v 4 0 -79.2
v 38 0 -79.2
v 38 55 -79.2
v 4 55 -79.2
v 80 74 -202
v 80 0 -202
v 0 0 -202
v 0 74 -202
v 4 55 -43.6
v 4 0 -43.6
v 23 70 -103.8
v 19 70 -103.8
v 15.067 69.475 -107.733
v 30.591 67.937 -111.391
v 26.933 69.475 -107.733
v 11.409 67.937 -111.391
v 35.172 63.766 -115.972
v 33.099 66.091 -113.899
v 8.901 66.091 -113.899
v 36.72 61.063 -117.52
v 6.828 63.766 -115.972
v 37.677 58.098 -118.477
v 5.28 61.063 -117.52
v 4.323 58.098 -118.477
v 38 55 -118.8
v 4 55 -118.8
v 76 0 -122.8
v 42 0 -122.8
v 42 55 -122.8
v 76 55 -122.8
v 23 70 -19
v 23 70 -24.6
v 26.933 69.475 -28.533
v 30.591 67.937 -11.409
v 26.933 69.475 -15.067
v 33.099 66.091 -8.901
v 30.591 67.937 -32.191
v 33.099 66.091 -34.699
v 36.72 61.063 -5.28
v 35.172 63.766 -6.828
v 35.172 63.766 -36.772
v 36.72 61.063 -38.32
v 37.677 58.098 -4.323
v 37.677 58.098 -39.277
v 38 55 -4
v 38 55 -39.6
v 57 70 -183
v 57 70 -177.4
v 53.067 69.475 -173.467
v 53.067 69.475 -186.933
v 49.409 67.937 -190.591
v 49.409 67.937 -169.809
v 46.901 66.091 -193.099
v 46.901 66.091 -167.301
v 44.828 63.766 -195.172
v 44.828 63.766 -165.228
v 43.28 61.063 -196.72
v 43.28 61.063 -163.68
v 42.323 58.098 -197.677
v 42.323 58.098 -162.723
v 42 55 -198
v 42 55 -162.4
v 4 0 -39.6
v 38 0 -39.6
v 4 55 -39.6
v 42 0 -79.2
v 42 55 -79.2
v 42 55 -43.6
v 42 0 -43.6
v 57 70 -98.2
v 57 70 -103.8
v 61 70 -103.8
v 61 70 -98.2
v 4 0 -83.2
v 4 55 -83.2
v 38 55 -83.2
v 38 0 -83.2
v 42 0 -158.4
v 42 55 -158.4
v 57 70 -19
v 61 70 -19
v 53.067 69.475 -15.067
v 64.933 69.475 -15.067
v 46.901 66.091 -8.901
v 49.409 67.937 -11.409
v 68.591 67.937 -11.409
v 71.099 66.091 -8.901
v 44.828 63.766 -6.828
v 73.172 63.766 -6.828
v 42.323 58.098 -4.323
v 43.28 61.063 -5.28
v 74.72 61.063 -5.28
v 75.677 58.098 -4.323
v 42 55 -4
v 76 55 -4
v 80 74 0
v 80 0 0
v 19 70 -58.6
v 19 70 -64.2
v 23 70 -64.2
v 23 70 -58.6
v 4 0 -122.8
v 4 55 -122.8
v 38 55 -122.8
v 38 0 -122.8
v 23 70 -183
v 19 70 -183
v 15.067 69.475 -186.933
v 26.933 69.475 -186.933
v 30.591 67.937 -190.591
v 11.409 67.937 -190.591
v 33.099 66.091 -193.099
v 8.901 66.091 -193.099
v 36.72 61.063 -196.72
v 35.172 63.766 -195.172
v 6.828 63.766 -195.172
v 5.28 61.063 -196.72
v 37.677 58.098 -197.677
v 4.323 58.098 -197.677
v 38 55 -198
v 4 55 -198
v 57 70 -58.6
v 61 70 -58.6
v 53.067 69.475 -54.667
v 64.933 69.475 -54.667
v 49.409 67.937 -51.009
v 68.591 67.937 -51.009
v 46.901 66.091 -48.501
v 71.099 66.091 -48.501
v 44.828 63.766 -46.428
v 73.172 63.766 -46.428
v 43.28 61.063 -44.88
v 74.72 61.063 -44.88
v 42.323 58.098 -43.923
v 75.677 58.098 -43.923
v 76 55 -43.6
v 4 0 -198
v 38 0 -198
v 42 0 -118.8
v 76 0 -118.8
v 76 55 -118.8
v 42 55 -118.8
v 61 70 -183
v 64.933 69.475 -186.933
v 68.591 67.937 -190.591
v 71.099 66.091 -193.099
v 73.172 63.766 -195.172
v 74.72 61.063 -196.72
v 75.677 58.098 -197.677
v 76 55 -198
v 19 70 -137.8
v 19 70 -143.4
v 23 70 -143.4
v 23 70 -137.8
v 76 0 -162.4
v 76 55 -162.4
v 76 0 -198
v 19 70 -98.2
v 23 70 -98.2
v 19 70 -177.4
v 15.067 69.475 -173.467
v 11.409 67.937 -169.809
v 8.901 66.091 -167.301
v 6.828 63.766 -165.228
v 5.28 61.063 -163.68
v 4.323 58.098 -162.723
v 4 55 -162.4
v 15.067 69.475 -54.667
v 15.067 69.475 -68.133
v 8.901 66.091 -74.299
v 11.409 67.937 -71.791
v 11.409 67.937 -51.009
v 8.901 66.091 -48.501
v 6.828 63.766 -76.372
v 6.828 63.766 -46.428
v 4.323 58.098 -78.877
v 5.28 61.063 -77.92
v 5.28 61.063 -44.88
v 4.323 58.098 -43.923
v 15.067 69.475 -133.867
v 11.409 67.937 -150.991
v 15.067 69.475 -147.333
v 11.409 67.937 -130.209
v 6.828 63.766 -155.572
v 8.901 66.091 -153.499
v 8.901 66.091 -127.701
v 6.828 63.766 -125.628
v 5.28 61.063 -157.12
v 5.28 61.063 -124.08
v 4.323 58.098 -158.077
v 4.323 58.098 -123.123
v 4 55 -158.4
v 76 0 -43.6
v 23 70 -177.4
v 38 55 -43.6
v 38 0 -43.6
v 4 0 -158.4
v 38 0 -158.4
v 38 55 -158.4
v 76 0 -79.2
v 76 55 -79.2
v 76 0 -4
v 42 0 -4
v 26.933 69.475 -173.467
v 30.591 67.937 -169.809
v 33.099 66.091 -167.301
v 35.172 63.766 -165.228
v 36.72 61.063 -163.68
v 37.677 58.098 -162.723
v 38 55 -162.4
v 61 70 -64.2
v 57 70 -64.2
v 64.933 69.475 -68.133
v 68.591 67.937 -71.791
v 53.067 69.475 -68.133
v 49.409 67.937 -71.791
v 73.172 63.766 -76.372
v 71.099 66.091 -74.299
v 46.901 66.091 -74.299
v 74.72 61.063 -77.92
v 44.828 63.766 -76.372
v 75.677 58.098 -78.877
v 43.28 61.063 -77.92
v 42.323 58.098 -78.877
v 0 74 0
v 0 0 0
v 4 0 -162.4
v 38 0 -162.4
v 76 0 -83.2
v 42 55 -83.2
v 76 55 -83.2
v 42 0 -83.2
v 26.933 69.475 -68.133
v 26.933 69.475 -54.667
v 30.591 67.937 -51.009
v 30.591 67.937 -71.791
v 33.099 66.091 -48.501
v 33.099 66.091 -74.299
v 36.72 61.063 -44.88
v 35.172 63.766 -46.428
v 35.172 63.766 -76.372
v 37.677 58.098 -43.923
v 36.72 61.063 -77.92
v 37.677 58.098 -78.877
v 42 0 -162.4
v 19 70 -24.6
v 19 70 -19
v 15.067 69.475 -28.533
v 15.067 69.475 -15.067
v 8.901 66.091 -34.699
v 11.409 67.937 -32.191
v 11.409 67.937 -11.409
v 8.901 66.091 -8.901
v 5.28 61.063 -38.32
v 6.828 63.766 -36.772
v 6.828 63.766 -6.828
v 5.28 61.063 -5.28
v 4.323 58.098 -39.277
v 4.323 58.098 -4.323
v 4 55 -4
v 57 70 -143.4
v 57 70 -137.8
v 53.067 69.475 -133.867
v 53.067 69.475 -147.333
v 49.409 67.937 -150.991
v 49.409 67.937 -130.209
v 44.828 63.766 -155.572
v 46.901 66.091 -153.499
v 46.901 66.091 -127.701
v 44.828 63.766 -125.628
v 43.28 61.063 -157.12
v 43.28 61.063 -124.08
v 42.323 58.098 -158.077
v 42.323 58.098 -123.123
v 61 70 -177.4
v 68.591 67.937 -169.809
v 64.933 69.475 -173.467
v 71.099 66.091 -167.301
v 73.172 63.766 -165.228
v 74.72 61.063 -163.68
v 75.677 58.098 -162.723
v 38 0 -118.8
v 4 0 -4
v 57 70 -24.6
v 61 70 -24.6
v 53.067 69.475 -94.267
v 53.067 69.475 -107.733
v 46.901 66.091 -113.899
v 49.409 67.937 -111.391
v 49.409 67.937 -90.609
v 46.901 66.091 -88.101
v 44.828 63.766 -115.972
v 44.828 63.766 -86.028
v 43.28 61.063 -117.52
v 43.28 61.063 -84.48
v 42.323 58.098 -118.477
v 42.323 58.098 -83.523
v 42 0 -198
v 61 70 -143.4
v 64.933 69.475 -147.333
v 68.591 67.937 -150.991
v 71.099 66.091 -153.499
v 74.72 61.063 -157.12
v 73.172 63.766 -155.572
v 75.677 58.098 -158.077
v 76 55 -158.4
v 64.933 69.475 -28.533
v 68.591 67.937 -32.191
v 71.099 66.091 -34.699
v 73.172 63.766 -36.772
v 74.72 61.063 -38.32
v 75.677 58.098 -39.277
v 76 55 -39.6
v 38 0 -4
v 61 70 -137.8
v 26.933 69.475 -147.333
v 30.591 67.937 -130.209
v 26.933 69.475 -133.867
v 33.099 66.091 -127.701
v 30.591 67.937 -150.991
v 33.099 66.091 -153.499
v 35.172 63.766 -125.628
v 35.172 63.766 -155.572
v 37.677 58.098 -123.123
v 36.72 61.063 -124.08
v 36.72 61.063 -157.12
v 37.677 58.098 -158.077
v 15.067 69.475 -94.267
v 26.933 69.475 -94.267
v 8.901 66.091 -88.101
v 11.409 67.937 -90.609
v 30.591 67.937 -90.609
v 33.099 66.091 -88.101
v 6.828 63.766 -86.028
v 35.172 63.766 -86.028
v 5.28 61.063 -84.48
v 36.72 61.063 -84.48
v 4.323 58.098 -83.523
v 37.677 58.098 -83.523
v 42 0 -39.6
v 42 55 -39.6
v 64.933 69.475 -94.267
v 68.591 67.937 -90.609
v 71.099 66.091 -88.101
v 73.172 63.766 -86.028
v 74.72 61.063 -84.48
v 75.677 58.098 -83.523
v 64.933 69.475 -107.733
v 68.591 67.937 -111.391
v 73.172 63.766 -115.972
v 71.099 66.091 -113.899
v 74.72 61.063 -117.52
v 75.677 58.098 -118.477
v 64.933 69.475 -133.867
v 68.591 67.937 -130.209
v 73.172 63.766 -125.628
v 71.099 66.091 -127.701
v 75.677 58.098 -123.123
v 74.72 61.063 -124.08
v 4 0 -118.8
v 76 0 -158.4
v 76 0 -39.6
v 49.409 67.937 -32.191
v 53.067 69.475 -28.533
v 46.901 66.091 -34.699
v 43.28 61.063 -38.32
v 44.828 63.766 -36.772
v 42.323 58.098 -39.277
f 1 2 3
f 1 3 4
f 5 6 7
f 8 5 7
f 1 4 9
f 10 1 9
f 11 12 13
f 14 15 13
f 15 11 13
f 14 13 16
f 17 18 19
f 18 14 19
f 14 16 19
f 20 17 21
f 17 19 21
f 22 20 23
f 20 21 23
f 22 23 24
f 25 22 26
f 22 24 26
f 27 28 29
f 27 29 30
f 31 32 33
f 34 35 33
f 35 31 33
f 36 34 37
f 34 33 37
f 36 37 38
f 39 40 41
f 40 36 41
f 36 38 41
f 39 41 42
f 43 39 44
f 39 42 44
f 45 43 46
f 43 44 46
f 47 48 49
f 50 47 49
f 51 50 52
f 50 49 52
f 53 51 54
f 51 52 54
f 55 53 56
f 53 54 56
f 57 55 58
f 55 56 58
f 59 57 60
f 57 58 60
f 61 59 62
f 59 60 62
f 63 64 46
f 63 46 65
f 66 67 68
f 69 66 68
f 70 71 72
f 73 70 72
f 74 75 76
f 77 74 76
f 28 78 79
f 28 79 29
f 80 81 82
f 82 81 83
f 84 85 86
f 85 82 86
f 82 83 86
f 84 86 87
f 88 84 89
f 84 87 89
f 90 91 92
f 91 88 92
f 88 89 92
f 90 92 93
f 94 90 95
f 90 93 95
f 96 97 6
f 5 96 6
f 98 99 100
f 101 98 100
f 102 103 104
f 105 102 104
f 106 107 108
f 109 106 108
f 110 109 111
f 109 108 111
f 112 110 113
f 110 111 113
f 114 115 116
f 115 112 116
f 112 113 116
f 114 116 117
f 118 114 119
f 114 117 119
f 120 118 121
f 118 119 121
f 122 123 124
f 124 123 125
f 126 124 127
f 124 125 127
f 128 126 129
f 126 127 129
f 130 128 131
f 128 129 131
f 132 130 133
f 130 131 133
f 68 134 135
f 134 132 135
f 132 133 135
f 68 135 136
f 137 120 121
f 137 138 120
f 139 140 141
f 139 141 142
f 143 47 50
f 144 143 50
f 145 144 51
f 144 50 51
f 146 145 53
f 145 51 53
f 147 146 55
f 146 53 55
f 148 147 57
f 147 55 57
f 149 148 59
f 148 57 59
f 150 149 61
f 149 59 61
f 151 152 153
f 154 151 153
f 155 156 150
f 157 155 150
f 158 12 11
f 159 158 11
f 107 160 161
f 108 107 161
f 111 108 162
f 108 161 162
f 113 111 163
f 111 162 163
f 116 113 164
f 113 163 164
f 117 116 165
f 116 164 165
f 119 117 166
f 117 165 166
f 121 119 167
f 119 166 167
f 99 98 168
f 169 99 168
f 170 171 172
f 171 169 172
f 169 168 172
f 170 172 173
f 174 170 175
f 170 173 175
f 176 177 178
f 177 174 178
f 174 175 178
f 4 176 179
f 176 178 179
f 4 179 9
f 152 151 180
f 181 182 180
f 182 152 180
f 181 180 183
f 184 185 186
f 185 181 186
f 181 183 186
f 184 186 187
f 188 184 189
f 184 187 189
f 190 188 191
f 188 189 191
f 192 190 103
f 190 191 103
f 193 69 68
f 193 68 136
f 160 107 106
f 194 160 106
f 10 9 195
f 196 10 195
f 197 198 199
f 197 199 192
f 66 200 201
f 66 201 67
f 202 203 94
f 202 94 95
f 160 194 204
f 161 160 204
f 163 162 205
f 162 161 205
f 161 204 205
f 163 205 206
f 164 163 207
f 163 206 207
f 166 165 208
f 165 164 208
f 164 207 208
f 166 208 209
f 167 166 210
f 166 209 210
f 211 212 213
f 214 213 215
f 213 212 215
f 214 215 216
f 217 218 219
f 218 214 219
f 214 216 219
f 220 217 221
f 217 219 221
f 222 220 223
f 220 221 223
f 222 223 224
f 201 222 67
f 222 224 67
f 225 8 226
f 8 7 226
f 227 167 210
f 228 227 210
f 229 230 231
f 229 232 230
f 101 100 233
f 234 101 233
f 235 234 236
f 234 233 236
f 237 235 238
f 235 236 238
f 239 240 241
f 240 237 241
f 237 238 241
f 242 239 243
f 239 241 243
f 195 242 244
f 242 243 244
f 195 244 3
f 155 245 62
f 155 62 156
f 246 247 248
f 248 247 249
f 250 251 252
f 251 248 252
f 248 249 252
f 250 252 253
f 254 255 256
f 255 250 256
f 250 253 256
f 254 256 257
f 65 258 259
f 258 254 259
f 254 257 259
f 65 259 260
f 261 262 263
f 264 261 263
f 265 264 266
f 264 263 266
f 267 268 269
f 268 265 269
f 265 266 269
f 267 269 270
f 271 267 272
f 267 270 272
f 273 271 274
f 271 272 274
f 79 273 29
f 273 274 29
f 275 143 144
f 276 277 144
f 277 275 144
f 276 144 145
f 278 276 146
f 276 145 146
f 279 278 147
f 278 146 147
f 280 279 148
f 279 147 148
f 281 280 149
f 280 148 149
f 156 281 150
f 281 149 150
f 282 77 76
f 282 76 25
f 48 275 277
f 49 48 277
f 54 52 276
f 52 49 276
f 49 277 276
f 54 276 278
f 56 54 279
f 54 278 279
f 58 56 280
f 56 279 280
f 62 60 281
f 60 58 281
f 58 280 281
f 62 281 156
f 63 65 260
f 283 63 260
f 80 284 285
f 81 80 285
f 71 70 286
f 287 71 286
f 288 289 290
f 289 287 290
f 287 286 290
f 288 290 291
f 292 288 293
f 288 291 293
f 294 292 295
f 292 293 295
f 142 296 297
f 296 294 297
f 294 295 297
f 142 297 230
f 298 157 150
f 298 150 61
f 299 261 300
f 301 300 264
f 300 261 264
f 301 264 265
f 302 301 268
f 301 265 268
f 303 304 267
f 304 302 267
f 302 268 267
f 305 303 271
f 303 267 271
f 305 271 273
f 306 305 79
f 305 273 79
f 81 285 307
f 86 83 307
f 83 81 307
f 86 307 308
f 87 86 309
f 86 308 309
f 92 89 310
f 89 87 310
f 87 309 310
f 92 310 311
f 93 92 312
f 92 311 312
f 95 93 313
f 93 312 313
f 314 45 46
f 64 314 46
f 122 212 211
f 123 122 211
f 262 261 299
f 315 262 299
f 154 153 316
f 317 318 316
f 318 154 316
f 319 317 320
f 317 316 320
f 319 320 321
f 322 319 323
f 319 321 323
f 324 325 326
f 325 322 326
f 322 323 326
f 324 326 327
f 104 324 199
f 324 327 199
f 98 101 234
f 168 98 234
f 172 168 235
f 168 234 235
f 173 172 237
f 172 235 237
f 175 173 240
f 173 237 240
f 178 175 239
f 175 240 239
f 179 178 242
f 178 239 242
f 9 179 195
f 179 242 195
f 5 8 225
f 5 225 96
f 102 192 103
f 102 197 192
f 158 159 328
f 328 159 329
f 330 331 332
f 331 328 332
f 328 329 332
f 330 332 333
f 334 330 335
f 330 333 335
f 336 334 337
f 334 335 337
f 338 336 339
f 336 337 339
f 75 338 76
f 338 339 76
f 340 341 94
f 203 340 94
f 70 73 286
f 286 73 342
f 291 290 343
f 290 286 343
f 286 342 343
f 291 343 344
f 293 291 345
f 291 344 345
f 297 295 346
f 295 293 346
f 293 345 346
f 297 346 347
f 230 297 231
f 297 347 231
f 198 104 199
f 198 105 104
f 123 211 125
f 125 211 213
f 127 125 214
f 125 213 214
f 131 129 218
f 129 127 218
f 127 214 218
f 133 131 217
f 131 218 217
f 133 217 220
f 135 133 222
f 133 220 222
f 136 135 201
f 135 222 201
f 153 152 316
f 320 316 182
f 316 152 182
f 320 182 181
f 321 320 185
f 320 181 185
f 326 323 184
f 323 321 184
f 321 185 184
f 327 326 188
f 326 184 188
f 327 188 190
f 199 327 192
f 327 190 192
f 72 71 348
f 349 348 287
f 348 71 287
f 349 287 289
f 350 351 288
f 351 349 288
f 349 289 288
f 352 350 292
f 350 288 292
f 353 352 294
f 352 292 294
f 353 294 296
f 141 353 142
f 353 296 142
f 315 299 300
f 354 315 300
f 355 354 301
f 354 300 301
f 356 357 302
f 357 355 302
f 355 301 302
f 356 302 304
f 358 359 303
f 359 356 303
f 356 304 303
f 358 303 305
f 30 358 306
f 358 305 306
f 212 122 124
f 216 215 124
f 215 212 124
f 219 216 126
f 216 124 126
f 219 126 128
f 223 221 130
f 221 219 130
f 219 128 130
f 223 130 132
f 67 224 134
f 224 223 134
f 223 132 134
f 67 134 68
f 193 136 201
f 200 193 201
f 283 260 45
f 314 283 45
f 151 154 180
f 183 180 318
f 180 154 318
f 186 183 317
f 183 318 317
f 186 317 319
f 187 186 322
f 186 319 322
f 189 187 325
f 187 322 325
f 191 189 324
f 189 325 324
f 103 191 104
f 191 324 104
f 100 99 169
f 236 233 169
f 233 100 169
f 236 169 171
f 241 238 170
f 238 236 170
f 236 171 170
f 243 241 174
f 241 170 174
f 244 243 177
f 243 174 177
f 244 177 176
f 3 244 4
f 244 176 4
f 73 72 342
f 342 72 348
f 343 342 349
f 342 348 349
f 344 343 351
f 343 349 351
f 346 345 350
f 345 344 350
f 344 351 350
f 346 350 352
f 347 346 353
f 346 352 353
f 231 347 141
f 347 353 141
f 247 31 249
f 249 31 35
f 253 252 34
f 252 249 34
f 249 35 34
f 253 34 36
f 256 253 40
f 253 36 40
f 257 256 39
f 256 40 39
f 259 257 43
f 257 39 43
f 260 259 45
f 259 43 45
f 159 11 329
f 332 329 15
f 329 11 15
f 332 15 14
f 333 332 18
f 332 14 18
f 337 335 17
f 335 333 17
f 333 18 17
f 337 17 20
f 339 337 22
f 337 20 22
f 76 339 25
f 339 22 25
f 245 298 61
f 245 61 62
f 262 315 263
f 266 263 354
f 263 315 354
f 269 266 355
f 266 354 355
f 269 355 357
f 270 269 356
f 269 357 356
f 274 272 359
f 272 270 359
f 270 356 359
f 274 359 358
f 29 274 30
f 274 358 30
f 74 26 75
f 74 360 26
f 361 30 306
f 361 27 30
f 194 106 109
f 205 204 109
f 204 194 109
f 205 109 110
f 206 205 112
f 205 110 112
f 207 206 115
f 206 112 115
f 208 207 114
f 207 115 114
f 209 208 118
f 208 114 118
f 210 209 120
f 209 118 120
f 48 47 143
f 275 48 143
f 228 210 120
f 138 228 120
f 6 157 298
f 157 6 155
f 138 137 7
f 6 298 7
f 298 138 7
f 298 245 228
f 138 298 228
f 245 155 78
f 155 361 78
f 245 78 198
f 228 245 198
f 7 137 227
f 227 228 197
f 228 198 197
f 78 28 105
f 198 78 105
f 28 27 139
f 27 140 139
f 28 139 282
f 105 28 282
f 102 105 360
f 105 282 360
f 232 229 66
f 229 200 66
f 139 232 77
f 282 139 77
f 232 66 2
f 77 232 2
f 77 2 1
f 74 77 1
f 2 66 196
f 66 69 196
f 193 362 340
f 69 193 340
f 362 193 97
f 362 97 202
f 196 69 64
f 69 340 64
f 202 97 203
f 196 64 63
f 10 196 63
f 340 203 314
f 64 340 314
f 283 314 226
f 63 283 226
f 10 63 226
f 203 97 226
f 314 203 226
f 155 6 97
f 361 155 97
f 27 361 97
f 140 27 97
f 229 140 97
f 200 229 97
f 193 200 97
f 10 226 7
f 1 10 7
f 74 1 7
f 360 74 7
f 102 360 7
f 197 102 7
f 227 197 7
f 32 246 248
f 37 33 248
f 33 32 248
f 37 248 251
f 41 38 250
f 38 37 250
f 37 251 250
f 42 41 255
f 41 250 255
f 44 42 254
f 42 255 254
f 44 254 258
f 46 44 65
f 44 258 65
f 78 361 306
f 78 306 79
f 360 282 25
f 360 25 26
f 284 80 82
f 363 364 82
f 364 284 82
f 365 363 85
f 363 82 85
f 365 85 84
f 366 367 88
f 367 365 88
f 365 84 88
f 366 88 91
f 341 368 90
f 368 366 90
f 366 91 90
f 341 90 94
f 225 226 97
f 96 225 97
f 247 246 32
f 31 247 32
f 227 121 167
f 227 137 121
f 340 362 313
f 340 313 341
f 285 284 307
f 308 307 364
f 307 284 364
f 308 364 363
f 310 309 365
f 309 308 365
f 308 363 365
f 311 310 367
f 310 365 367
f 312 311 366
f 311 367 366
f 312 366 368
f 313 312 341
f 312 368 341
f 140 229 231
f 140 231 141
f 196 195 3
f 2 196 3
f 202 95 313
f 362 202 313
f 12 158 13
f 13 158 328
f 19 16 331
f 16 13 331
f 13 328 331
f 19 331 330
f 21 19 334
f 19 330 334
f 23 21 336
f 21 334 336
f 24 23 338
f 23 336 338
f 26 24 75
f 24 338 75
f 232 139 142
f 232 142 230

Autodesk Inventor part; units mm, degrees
ref_plane "YZ Plane" through (0, 0, 0) normal (1, 0, 0) x (0, 1, 0)
ref_plane "XZ Plane" through (0, 0, 0) normal (0, 1, 0) x (-1, 0, 0)
ref_plane "XY Plane" through (0, 0, 0) normal (0, 0, 1) x (1, 0, 0)
sketch "Sketch1" plane through (0, 0, 0) normal (0, 1, 0) x (-1, 0, 0)
  line L0 (0, 0) -> (-80, 0)
  line L1 (-80, 0) -> (-80, -202)
  line L2 (-80, -202) -> (0, -202)
  line L3 (0, -202) -> (0, 0)
  line L4 (-4, -4) -> (-38, -4)
  line L5 (-38, -4) -> (-38, -39.6)
  line L6 (-38, -39.6) -> (-4, -39.6)
  line L7 (-4, -39.6) -> (-4, -4)
  line L8 (-4, -43.6) -> (-38, -43.6)
  line L9 (-38, -43.6) -> (-38, -79.2)
  line L10 (-38, -79.2) -> (-4, -79.2)
  line L11 (-4, -79.2) -> (-4, -43.6)
  line L12 (-4, -83.2) -> (-38, -83.2)
  line L13 (-38, -83.2) -> (-38, -118.8)
  line L14 (-38, -118.8) -> (-4, -118.8)
  line L15 (-4, -118.8) -> (-4, -83.2)
  line L16 (-4, -122.8) -> (-38, -122.8)
  line L17 (-38, -122.8) -> (-38, -158.4)
  line L18 (-38, -158.4) -> (-4, -158.4)
  line L19 (-4, -158.4) -> (-4, -122.8)
  line L20 (-4, -162.4) -> (-38, -162.4)
  line L21 (-38, -162.4) -> (-38, -198)
  line L22 (-38, -198) -> (-4, -198)
  line L23 (-4, -198) -> (-4, -162.4)
  line L24 (-76, -198) -> (-42, -198)
  line L25 (-42, -162.4) -> (-76, -162.4)
  line L26 (-42, -198) -> (-42, -162.4)
  line L27 (-76, -162.4) -> (-76, -198)
  line L28 (-76, -158.4) -> (-42, -158.4)
  line L29 (-76, -122.8) -> (-76, -158.4)
  line L30 (-42, -122.8) -> (-76, -122.8)
  line L31 (-42, -158.4) -> (-42, -122.8)
  line L32 (-76, -118.8) -> (-42, -118.8)
  line L33 (-76, -83.2) -> (-76, -118.8)
  line L34 (-42, -118.8) -> (-42, -83.2)
  line L35 (-42, -4) -> (-76, -4)
  line L36 (-76, -4) -> (-76, -39.6)
  line L37 (-76, -39.6) -> (-42, -39.6)
  line L38 (-42, -83.2) -> (-76, -83.2)
  line L39 (-76, -79.2) -> (-42, -79.2)
  line L40 (-42, -43.6) -> (-76, -43.6)
  line L41 (-76, -43.6) -> (-76, -79.2)
  line L42 (-42, -79.2) -> (-42, -43.6)
  line L43 (-42, -39.6) -> (-42, -4)
  dimension "d0" = 34
  dimension "d1" = 35.6
  dimension "d2" = 4
  dimension "d3" = 4
  dimension "d6" = 39.6
  dimension "d11" = 4
  dimension "d14" = 38
  dimension "d19" = 4
extrude "Extrusion1" add sketch "Sketch1" along normal blind 70
sketch "Sketch2" plane through (0, 70, 0) normal (0, 1, 0) x (1, 0, 0)
  line L0 (0, 0) -> (80, 0) projected
  line L1 (0, 202) -> (0, 0) projected
  line L2 (80, 0) -> (80, 202) projected
  line L3 (80, 202) -> (0, 202) projected
extrude "Extrusion2" add sketch "Sketch2" along normal blind 4
ref_plane "Work Plane4" through (40, 0, -202) normal (-1, 0, 0) x (0, 0, 1)
fillet "Fillet1" radius 15 40 edges at (21, 70, -198) (4, 70, -180.2) (59, 70, -198) (42, 70, -180.2) (59, 70, -158.4) (42, 70, -140.6) (21, 70, -158.4) (4, 70, -140.6) (59, 70, -118.8) (42, 70, -101) (21, 70, -118.8) (4, 70, -101) (21, 70, -79.2) (4, 70, -61.4) (59, 70, -79.2) (42, 70, -61.4) (59, 70, -39.6) (42, 70, -21.8) (21, 70, -39.6) (4, 70, -21.8) (76, 70, -21.8) (59, 70, -4) (38, 70, -21.8) (21, 70, -4) (38, 70, -61.4) (21, 70, -43.6) (76, 70, -61.4) (59, 70, -43.6) (76, 70, -101) (59, 70, -83.2) (76, 70, -140.6) (59, 70, -122.8) (38, 70, -140.6) (21, 70, -122.8) (38, 70, -180.2) (21, 70, -162.4) (76, 70, -180.2) (59, 70, -162.4) (38, 70, -101) (21, 70, -83.2)
properties part number "Contenedor B" material "ABS Plastic"
